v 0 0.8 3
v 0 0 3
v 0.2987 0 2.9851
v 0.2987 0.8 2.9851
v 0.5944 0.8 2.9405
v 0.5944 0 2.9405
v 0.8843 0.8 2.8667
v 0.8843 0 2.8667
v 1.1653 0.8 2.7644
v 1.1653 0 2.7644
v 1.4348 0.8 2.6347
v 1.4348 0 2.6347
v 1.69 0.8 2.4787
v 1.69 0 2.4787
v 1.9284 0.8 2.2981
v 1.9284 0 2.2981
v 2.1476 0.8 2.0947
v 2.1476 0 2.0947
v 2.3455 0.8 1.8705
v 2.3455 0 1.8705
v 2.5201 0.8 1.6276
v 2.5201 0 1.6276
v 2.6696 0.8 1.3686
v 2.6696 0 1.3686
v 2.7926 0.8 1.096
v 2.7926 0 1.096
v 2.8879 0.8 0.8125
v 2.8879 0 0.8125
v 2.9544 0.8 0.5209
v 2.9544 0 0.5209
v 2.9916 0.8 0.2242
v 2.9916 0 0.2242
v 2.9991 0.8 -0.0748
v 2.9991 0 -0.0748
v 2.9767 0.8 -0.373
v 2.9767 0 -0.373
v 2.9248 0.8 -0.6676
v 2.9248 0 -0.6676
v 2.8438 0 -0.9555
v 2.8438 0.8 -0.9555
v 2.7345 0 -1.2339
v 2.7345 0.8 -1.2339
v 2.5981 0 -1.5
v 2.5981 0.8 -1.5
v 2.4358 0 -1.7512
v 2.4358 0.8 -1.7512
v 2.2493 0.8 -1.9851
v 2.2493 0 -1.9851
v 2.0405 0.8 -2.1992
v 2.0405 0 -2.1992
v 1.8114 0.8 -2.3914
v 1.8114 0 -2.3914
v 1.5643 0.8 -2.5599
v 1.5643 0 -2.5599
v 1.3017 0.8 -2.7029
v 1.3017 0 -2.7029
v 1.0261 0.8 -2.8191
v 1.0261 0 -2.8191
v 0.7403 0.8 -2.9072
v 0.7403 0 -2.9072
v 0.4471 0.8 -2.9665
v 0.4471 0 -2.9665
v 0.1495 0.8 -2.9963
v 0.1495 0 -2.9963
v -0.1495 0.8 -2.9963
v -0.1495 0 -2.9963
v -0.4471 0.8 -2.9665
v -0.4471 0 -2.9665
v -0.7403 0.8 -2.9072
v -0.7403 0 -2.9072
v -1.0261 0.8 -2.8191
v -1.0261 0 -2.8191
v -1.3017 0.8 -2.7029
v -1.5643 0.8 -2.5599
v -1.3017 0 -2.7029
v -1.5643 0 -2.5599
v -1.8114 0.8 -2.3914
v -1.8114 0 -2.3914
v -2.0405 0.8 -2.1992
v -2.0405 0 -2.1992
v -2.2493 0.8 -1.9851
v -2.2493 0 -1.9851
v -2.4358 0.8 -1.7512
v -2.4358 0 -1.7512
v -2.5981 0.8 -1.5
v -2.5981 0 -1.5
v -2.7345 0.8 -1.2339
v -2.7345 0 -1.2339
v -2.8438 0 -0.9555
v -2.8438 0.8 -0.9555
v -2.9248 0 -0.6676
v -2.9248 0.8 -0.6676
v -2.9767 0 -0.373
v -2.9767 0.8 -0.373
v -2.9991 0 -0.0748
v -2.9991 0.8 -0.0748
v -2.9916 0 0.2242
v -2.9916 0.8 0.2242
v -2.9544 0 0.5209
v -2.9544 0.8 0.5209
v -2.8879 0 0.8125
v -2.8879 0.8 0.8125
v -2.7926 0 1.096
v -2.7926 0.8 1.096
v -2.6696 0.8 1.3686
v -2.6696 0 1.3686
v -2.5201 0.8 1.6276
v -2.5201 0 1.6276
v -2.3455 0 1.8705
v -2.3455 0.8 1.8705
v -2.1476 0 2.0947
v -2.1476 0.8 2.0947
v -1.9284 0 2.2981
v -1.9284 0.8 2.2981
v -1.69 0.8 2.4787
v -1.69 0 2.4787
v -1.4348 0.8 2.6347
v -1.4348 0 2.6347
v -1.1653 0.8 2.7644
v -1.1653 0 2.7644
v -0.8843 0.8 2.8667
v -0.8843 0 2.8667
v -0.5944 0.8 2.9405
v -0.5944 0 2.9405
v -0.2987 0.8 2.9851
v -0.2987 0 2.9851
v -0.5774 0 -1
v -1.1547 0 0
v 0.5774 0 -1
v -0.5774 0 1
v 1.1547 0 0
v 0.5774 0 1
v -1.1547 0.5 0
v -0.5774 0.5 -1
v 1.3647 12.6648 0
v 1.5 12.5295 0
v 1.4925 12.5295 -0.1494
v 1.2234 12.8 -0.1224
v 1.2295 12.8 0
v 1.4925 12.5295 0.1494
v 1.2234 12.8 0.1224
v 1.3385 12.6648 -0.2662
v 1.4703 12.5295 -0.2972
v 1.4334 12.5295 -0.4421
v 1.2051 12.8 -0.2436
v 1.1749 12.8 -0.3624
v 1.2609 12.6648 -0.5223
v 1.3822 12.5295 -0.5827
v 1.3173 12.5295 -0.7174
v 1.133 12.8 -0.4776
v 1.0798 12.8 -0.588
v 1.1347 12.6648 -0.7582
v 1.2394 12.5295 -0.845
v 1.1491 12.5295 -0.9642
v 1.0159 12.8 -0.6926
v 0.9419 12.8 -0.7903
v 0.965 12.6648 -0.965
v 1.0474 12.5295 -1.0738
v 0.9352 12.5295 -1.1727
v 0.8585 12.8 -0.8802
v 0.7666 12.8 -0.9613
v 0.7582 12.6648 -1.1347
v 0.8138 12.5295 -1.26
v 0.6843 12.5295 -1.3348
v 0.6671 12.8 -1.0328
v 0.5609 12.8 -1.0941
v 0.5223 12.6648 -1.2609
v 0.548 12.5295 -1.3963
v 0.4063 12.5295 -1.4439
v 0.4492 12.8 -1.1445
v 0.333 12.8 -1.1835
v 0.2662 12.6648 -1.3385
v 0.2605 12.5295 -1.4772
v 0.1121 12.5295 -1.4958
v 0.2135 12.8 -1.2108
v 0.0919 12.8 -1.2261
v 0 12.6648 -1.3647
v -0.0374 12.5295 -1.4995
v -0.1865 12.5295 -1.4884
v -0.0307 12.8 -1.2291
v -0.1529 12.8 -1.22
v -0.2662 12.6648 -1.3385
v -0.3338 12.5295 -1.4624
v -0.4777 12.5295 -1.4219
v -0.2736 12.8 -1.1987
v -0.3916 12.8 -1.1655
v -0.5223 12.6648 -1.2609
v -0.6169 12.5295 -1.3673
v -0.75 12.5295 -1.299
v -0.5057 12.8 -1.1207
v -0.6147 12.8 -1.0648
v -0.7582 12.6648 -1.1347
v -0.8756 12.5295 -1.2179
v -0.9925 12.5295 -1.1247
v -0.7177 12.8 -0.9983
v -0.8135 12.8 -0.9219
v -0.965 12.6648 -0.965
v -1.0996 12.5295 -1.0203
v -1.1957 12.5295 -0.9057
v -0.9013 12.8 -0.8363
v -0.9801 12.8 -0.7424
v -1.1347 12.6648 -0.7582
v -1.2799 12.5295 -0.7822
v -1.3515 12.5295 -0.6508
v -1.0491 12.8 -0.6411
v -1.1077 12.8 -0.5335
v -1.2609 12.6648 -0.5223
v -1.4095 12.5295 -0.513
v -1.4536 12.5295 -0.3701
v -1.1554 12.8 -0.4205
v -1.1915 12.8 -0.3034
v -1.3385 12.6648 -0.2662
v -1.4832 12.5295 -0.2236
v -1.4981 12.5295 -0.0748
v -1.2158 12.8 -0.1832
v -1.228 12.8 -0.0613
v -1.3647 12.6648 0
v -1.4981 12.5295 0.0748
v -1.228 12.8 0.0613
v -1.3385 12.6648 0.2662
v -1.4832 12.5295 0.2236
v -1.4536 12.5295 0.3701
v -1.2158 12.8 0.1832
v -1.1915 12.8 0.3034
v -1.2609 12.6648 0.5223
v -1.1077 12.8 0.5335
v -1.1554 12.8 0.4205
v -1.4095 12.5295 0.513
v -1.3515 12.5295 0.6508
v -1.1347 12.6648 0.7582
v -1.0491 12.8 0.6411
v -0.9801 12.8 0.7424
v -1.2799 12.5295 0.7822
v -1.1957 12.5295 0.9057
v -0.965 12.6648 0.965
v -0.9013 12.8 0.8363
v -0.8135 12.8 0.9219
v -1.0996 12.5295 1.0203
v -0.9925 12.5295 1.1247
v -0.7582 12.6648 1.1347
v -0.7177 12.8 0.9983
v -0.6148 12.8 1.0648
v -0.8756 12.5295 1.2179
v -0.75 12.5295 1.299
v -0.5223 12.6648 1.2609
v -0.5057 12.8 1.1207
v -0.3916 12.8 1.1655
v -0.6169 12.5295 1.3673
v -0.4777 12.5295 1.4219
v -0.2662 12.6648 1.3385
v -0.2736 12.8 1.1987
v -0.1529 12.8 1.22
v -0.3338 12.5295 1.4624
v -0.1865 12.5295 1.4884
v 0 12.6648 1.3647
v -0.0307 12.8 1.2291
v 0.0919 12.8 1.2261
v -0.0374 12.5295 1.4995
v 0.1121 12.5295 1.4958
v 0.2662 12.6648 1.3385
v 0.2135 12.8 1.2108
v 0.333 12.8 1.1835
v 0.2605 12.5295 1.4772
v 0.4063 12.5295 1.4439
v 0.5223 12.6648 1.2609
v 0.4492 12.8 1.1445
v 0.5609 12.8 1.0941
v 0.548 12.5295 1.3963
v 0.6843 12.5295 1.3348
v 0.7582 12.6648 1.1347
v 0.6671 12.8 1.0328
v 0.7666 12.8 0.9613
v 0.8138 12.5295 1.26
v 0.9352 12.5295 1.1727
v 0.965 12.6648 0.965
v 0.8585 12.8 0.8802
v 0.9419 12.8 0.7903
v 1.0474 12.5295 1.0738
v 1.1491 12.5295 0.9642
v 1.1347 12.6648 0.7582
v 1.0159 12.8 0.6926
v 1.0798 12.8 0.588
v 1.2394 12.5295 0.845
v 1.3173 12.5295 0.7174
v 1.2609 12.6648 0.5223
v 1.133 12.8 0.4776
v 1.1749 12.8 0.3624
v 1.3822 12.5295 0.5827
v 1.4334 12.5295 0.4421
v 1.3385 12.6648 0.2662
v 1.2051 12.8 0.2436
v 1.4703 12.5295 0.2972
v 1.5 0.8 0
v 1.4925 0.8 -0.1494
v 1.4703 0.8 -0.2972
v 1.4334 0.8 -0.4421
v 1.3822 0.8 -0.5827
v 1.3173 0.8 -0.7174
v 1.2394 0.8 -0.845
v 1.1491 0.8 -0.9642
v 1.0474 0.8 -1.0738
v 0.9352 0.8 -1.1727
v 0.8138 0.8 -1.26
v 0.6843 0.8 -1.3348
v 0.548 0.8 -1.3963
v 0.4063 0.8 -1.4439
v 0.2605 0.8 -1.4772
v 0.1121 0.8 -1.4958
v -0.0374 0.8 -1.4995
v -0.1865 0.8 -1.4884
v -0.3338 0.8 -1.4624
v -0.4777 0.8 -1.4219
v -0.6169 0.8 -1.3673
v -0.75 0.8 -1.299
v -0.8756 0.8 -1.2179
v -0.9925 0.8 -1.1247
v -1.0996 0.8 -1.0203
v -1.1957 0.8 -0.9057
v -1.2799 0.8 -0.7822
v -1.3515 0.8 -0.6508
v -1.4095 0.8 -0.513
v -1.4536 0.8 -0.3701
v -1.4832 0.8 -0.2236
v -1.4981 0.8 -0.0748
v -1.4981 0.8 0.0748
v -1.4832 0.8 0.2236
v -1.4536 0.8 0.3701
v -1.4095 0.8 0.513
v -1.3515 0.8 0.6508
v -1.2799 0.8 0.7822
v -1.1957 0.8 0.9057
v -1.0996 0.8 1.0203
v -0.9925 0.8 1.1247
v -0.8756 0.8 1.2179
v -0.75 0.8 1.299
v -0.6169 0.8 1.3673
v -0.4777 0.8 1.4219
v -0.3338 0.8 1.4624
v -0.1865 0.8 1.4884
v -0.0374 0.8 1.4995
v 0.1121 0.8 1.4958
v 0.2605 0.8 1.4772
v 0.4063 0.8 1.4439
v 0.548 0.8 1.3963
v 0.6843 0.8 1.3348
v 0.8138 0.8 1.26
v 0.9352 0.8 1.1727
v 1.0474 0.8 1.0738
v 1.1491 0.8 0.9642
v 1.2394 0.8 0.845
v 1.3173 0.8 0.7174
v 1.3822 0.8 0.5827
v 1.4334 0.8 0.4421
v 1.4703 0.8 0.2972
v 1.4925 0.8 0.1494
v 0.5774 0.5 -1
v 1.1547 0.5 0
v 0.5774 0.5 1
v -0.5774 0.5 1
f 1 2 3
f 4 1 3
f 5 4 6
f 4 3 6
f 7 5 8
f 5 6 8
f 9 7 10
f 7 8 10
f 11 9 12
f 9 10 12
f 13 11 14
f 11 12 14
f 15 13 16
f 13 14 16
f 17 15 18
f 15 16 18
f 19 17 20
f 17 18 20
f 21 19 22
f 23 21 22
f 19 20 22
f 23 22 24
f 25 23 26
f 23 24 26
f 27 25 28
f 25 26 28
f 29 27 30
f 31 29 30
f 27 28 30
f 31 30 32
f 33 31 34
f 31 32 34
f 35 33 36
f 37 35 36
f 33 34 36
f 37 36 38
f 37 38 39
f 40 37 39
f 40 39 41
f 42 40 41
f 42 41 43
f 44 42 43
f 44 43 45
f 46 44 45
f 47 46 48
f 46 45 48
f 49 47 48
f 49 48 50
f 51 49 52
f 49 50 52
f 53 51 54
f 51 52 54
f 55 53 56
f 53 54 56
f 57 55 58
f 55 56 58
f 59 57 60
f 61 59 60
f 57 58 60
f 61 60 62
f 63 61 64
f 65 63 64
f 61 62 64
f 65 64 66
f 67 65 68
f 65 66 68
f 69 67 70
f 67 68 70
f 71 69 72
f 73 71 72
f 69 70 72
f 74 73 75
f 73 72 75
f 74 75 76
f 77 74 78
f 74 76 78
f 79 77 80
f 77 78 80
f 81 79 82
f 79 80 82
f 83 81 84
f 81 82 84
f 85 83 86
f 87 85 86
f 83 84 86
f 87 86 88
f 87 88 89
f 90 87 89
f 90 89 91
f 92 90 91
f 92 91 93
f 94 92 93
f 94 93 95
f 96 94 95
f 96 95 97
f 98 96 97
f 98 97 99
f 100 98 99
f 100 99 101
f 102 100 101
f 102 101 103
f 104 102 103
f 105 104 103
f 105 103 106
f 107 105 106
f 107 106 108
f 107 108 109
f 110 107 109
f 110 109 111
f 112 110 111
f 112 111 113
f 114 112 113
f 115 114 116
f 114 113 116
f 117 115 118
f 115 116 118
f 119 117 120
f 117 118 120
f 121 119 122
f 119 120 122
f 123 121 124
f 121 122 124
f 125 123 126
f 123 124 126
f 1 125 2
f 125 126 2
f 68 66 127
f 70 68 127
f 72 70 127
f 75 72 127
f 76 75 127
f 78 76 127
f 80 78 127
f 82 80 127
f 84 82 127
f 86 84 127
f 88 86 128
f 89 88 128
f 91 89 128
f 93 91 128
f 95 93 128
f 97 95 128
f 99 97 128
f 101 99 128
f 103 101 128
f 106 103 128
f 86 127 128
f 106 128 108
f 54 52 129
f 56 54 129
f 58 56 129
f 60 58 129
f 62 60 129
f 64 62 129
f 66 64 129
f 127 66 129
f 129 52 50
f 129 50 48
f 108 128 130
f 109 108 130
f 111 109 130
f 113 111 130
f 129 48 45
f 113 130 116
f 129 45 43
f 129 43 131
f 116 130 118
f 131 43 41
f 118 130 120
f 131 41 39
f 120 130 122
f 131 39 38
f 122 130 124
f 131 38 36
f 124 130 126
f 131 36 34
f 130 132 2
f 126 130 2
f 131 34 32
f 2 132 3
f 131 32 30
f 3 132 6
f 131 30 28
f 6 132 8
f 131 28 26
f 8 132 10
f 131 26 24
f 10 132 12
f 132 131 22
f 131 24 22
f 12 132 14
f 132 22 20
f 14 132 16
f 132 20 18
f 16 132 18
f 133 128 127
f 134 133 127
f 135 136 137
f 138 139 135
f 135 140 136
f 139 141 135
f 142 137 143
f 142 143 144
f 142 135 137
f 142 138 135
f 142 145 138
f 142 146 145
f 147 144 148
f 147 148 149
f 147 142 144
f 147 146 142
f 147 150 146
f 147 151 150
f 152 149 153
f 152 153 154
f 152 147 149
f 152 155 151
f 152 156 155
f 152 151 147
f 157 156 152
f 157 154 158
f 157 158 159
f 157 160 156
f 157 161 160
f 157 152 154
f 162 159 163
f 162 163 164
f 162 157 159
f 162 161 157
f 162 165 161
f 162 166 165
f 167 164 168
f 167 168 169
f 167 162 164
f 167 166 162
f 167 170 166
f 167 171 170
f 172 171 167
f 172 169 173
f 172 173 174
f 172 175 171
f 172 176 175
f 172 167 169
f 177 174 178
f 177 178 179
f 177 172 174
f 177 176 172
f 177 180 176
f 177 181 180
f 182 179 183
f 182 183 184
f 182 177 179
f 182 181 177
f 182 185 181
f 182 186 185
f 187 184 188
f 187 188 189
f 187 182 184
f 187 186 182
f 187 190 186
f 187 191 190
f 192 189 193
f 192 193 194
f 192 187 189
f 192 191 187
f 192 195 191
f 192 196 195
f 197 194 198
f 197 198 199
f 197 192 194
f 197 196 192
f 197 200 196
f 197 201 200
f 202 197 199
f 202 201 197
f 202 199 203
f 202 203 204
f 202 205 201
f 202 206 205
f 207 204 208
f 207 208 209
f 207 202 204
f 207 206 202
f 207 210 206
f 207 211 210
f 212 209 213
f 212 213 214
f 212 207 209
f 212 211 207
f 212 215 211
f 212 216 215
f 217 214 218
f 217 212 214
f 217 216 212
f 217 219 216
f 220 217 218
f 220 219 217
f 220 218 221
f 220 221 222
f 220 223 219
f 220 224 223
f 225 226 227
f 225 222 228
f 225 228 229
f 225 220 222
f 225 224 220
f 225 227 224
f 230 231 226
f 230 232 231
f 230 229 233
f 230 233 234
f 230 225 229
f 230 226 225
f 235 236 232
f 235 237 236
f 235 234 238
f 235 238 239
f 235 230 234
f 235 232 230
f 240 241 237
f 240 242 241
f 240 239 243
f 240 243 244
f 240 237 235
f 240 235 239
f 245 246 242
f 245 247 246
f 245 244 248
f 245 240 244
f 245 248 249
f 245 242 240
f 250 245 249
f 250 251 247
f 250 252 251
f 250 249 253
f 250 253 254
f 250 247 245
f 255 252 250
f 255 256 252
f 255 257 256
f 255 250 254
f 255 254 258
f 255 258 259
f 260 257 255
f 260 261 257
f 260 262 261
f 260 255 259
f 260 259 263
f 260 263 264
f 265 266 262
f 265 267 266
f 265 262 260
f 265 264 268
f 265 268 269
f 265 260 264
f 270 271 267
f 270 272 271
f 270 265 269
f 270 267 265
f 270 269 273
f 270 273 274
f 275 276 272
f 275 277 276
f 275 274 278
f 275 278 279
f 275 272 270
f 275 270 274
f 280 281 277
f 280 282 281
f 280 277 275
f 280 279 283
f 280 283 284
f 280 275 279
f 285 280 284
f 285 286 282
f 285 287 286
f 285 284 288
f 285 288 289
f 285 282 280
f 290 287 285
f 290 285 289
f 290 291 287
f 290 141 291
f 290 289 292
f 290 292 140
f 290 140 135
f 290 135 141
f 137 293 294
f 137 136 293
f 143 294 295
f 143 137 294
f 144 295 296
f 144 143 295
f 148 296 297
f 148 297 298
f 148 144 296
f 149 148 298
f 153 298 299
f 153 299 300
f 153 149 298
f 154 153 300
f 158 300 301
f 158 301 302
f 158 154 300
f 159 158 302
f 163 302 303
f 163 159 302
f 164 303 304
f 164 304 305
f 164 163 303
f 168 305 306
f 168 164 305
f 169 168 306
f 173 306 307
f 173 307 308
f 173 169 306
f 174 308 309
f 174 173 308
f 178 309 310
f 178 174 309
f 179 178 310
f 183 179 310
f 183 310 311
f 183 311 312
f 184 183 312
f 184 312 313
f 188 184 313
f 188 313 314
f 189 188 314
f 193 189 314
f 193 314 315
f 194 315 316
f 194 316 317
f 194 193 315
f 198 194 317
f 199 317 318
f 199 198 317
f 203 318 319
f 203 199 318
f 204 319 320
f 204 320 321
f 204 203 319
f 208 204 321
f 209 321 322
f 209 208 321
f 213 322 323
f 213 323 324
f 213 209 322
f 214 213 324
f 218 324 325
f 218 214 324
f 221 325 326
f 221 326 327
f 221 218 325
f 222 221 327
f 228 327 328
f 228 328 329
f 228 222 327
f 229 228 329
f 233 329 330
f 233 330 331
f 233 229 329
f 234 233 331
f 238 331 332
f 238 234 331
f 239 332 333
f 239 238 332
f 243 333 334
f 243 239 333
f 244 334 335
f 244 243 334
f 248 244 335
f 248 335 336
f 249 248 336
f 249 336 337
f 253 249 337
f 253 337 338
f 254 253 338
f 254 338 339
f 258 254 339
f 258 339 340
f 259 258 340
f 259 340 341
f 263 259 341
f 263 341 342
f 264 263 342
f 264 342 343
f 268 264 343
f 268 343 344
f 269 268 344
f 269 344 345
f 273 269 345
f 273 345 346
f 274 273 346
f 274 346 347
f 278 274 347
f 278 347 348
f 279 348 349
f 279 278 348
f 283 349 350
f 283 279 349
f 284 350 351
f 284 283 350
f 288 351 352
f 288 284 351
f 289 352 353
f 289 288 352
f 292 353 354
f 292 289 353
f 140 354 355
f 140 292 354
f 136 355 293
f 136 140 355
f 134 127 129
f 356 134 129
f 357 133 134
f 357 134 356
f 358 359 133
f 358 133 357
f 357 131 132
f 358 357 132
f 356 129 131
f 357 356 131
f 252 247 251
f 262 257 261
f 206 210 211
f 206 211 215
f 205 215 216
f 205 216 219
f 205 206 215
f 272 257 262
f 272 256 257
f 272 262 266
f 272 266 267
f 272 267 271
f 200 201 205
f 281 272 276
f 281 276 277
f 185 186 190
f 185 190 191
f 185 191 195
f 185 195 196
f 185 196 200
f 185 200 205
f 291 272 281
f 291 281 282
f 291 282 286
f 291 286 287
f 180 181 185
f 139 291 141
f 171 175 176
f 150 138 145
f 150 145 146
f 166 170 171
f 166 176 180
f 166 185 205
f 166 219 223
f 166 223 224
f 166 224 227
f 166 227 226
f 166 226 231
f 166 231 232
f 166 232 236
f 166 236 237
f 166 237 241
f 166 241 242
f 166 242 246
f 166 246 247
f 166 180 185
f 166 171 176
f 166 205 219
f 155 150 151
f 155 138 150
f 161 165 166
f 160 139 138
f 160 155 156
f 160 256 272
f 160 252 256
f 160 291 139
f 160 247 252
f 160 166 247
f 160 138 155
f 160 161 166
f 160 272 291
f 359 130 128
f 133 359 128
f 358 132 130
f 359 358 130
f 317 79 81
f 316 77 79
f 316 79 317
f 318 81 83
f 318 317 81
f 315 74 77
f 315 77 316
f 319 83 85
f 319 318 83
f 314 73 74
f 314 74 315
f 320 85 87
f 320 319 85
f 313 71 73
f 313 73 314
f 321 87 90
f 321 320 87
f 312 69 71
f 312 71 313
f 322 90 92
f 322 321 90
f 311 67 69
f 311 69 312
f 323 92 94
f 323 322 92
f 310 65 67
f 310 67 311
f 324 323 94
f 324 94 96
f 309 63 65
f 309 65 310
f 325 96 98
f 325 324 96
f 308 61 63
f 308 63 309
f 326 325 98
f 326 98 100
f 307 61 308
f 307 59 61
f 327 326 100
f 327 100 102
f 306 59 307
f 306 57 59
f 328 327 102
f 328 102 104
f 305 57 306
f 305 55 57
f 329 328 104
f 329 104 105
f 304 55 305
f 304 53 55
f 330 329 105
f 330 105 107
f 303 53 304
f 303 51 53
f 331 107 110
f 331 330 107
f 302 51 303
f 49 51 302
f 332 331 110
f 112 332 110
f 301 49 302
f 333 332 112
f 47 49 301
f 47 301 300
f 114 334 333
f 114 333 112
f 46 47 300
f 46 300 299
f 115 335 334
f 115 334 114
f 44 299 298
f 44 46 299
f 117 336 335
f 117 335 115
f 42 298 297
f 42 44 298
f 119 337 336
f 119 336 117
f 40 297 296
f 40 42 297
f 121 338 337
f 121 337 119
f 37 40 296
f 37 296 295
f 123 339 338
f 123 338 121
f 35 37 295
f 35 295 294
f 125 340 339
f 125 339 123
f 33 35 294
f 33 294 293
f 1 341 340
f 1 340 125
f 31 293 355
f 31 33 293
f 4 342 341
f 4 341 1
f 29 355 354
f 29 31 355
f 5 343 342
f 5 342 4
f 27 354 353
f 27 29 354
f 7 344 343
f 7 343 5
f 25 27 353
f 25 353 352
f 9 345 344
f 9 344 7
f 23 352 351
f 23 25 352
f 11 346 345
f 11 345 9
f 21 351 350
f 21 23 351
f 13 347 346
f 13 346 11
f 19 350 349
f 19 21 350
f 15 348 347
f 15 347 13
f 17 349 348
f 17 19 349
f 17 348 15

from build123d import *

# Parameters (mm, degrees)
SKETCH_1_R          = 3
EXTRUDE_1_DEPTH     = 0.8
CUT_EXTRUDE_1_DEPTH = 0.5


# Read off the part's stored shape, not the designer's step: M3 机械螺纹 螺柱3
with BuildPart() as part:
    # 草图1 → 凸台-拉伸1 (new body)
    with BuildSketch(Plane(origin=(0, 0, 0), x_dir=(1, 0, 0), z_dir=(0, 1, 0))):
        with Locations(Location((0, 0, 0), (0, 0, 270))):
            Circle(SKETCH_1_R)
    extrude(amount=EXTRUDE_1_DEPTH)

    # M3 机械螺纹 螺柱3 outline → M3 机械螺纹 螺柱3 (revolve)
    with BuildSketch(Plane.XY):
        Polygon((1.2295, 12.8), (0, 12.8), (0, 0.8), (1.5, 0.8), (1.5, 12.5295), align=None)
    revolve(axis=Axis((0, 0, 0), (0, 1, 0)))

    # 草图8 → 切除-拉伸1 (cut)
    with BuildSketch(Plane.XZ):
        Polygon((1.154700538, 0), (0.577350269, 1), (-0.577350269, 1), (-1.154700538, 0), (-0.577350269, -1), (0.577350269, -1), align=None)
    extrude(amount=-CUT_EXTRUDE_1_DEPTH, mode=Mode.SUBTRACT)


solid = part.part
